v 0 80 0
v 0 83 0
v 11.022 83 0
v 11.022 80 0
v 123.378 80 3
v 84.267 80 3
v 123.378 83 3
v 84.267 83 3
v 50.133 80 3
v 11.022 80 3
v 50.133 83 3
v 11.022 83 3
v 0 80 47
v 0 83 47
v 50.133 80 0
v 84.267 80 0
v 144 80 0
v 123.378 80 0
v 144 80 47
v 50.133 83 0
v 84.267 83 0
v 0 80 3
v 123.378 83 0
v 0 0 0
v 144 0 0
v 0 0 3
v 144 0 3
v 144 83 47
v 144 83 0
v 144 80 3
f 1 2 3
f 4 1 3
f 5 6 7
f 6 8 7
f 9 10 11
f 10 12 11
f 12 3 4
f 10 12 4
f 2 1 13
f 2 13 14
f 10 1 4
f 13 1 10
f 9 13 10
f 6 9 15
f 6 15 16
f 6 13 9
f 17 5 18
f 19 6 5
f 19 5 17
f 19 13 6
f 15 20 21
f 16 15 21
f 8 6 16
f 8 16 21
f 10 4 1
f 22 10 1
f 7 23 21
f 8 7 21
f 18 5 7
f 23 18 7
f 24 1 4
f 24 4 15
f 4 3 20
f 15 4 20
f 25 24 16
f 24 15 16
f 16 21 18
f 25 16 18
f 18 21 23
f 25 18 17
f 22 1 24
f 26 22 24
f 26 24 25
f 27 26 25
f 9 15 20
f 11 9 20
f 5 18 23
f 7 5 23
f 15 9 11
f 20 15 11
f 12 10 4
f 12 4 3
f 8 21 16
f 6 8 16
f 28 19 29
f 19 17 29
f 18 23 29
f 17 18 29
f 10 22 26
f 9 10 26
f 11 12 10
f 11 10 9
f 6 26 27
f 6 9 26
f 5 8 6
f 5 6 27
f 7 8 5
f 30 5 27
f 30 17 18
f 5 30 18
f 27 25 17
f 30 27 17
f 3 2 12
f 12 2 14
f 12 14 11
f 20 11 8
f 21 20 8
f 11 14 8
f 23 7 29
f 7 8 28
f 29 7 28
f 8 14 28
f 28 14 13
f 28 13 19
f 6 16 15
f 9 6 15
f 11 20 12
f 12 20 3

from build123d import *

# Parameters (mm, degrees)
F2_DEPTH = 3
F3_W     = 20.6222088363
F3_H     = 3
F3_W_2   = 39.1111204304
F3_W_3   = 39.1111154266
F3_W_4   = 11.022227565
F3_W_5   = 34.1333277417
F4_DEPTH = 44
F5_DEPTH = 3


with BuildPart() as f2:
    # F1 (on Top) → F2 (new body)
    with BuildSketch(Plane.XY):
        Polygon((0, 80), (0, 0), (144, 0), (144, 80), (123.3777911637, 80), (123.3777911637, 83), (84.2666707333, 83), (84.2666707333, 80), (50.1333429916, 80), (50.1333429916, 83), (11.022227565, 83), (11.022227565, 80), align=None)
    extrude(amount=F2_DEPTH)


with BuildPart() as f4:
    # F3 (on face) → F4 (new body)
    with BuildSketch(Plane.XY.offset(3)):
        with Locations((133.6888955819, 81.5)):
            Rectangle(F3_W, F3_H)
        with Locations((103.8222309485, 81.5)):
            Rectangle(F3_W_2, F3_H)
        with Locations((30.5777852783, 81.5)):
            Rectangle(F3_W_3, F3_H)
        with Locations((5.5111137825, 81.5)):
            Rectangle(F3_W_4, F3_H)
        with Locations((67.2000068624, 81.5)):
            Rectangle(F3_W_5, F3_H)
    extrude(amount=F4_DEPTH)

    # F3 (on face) → F5 (join)
    with BuildSketch(Plane.XY.offset(3)):
        with Locations((5.5111137825, 81.5)):
            Rectangle(F3_W_4, F3_H)
        with Locations((67.2000068624, 81.5)):
            Rectangle(F3_W_5, F3_H)
        with Locations((133.6888955819, 81.5)):
            Rectangle(F3_W, F3_H)
    extrude(amount=-F5_DEPTH)


solid = Compound([f2.part, f4.part])
